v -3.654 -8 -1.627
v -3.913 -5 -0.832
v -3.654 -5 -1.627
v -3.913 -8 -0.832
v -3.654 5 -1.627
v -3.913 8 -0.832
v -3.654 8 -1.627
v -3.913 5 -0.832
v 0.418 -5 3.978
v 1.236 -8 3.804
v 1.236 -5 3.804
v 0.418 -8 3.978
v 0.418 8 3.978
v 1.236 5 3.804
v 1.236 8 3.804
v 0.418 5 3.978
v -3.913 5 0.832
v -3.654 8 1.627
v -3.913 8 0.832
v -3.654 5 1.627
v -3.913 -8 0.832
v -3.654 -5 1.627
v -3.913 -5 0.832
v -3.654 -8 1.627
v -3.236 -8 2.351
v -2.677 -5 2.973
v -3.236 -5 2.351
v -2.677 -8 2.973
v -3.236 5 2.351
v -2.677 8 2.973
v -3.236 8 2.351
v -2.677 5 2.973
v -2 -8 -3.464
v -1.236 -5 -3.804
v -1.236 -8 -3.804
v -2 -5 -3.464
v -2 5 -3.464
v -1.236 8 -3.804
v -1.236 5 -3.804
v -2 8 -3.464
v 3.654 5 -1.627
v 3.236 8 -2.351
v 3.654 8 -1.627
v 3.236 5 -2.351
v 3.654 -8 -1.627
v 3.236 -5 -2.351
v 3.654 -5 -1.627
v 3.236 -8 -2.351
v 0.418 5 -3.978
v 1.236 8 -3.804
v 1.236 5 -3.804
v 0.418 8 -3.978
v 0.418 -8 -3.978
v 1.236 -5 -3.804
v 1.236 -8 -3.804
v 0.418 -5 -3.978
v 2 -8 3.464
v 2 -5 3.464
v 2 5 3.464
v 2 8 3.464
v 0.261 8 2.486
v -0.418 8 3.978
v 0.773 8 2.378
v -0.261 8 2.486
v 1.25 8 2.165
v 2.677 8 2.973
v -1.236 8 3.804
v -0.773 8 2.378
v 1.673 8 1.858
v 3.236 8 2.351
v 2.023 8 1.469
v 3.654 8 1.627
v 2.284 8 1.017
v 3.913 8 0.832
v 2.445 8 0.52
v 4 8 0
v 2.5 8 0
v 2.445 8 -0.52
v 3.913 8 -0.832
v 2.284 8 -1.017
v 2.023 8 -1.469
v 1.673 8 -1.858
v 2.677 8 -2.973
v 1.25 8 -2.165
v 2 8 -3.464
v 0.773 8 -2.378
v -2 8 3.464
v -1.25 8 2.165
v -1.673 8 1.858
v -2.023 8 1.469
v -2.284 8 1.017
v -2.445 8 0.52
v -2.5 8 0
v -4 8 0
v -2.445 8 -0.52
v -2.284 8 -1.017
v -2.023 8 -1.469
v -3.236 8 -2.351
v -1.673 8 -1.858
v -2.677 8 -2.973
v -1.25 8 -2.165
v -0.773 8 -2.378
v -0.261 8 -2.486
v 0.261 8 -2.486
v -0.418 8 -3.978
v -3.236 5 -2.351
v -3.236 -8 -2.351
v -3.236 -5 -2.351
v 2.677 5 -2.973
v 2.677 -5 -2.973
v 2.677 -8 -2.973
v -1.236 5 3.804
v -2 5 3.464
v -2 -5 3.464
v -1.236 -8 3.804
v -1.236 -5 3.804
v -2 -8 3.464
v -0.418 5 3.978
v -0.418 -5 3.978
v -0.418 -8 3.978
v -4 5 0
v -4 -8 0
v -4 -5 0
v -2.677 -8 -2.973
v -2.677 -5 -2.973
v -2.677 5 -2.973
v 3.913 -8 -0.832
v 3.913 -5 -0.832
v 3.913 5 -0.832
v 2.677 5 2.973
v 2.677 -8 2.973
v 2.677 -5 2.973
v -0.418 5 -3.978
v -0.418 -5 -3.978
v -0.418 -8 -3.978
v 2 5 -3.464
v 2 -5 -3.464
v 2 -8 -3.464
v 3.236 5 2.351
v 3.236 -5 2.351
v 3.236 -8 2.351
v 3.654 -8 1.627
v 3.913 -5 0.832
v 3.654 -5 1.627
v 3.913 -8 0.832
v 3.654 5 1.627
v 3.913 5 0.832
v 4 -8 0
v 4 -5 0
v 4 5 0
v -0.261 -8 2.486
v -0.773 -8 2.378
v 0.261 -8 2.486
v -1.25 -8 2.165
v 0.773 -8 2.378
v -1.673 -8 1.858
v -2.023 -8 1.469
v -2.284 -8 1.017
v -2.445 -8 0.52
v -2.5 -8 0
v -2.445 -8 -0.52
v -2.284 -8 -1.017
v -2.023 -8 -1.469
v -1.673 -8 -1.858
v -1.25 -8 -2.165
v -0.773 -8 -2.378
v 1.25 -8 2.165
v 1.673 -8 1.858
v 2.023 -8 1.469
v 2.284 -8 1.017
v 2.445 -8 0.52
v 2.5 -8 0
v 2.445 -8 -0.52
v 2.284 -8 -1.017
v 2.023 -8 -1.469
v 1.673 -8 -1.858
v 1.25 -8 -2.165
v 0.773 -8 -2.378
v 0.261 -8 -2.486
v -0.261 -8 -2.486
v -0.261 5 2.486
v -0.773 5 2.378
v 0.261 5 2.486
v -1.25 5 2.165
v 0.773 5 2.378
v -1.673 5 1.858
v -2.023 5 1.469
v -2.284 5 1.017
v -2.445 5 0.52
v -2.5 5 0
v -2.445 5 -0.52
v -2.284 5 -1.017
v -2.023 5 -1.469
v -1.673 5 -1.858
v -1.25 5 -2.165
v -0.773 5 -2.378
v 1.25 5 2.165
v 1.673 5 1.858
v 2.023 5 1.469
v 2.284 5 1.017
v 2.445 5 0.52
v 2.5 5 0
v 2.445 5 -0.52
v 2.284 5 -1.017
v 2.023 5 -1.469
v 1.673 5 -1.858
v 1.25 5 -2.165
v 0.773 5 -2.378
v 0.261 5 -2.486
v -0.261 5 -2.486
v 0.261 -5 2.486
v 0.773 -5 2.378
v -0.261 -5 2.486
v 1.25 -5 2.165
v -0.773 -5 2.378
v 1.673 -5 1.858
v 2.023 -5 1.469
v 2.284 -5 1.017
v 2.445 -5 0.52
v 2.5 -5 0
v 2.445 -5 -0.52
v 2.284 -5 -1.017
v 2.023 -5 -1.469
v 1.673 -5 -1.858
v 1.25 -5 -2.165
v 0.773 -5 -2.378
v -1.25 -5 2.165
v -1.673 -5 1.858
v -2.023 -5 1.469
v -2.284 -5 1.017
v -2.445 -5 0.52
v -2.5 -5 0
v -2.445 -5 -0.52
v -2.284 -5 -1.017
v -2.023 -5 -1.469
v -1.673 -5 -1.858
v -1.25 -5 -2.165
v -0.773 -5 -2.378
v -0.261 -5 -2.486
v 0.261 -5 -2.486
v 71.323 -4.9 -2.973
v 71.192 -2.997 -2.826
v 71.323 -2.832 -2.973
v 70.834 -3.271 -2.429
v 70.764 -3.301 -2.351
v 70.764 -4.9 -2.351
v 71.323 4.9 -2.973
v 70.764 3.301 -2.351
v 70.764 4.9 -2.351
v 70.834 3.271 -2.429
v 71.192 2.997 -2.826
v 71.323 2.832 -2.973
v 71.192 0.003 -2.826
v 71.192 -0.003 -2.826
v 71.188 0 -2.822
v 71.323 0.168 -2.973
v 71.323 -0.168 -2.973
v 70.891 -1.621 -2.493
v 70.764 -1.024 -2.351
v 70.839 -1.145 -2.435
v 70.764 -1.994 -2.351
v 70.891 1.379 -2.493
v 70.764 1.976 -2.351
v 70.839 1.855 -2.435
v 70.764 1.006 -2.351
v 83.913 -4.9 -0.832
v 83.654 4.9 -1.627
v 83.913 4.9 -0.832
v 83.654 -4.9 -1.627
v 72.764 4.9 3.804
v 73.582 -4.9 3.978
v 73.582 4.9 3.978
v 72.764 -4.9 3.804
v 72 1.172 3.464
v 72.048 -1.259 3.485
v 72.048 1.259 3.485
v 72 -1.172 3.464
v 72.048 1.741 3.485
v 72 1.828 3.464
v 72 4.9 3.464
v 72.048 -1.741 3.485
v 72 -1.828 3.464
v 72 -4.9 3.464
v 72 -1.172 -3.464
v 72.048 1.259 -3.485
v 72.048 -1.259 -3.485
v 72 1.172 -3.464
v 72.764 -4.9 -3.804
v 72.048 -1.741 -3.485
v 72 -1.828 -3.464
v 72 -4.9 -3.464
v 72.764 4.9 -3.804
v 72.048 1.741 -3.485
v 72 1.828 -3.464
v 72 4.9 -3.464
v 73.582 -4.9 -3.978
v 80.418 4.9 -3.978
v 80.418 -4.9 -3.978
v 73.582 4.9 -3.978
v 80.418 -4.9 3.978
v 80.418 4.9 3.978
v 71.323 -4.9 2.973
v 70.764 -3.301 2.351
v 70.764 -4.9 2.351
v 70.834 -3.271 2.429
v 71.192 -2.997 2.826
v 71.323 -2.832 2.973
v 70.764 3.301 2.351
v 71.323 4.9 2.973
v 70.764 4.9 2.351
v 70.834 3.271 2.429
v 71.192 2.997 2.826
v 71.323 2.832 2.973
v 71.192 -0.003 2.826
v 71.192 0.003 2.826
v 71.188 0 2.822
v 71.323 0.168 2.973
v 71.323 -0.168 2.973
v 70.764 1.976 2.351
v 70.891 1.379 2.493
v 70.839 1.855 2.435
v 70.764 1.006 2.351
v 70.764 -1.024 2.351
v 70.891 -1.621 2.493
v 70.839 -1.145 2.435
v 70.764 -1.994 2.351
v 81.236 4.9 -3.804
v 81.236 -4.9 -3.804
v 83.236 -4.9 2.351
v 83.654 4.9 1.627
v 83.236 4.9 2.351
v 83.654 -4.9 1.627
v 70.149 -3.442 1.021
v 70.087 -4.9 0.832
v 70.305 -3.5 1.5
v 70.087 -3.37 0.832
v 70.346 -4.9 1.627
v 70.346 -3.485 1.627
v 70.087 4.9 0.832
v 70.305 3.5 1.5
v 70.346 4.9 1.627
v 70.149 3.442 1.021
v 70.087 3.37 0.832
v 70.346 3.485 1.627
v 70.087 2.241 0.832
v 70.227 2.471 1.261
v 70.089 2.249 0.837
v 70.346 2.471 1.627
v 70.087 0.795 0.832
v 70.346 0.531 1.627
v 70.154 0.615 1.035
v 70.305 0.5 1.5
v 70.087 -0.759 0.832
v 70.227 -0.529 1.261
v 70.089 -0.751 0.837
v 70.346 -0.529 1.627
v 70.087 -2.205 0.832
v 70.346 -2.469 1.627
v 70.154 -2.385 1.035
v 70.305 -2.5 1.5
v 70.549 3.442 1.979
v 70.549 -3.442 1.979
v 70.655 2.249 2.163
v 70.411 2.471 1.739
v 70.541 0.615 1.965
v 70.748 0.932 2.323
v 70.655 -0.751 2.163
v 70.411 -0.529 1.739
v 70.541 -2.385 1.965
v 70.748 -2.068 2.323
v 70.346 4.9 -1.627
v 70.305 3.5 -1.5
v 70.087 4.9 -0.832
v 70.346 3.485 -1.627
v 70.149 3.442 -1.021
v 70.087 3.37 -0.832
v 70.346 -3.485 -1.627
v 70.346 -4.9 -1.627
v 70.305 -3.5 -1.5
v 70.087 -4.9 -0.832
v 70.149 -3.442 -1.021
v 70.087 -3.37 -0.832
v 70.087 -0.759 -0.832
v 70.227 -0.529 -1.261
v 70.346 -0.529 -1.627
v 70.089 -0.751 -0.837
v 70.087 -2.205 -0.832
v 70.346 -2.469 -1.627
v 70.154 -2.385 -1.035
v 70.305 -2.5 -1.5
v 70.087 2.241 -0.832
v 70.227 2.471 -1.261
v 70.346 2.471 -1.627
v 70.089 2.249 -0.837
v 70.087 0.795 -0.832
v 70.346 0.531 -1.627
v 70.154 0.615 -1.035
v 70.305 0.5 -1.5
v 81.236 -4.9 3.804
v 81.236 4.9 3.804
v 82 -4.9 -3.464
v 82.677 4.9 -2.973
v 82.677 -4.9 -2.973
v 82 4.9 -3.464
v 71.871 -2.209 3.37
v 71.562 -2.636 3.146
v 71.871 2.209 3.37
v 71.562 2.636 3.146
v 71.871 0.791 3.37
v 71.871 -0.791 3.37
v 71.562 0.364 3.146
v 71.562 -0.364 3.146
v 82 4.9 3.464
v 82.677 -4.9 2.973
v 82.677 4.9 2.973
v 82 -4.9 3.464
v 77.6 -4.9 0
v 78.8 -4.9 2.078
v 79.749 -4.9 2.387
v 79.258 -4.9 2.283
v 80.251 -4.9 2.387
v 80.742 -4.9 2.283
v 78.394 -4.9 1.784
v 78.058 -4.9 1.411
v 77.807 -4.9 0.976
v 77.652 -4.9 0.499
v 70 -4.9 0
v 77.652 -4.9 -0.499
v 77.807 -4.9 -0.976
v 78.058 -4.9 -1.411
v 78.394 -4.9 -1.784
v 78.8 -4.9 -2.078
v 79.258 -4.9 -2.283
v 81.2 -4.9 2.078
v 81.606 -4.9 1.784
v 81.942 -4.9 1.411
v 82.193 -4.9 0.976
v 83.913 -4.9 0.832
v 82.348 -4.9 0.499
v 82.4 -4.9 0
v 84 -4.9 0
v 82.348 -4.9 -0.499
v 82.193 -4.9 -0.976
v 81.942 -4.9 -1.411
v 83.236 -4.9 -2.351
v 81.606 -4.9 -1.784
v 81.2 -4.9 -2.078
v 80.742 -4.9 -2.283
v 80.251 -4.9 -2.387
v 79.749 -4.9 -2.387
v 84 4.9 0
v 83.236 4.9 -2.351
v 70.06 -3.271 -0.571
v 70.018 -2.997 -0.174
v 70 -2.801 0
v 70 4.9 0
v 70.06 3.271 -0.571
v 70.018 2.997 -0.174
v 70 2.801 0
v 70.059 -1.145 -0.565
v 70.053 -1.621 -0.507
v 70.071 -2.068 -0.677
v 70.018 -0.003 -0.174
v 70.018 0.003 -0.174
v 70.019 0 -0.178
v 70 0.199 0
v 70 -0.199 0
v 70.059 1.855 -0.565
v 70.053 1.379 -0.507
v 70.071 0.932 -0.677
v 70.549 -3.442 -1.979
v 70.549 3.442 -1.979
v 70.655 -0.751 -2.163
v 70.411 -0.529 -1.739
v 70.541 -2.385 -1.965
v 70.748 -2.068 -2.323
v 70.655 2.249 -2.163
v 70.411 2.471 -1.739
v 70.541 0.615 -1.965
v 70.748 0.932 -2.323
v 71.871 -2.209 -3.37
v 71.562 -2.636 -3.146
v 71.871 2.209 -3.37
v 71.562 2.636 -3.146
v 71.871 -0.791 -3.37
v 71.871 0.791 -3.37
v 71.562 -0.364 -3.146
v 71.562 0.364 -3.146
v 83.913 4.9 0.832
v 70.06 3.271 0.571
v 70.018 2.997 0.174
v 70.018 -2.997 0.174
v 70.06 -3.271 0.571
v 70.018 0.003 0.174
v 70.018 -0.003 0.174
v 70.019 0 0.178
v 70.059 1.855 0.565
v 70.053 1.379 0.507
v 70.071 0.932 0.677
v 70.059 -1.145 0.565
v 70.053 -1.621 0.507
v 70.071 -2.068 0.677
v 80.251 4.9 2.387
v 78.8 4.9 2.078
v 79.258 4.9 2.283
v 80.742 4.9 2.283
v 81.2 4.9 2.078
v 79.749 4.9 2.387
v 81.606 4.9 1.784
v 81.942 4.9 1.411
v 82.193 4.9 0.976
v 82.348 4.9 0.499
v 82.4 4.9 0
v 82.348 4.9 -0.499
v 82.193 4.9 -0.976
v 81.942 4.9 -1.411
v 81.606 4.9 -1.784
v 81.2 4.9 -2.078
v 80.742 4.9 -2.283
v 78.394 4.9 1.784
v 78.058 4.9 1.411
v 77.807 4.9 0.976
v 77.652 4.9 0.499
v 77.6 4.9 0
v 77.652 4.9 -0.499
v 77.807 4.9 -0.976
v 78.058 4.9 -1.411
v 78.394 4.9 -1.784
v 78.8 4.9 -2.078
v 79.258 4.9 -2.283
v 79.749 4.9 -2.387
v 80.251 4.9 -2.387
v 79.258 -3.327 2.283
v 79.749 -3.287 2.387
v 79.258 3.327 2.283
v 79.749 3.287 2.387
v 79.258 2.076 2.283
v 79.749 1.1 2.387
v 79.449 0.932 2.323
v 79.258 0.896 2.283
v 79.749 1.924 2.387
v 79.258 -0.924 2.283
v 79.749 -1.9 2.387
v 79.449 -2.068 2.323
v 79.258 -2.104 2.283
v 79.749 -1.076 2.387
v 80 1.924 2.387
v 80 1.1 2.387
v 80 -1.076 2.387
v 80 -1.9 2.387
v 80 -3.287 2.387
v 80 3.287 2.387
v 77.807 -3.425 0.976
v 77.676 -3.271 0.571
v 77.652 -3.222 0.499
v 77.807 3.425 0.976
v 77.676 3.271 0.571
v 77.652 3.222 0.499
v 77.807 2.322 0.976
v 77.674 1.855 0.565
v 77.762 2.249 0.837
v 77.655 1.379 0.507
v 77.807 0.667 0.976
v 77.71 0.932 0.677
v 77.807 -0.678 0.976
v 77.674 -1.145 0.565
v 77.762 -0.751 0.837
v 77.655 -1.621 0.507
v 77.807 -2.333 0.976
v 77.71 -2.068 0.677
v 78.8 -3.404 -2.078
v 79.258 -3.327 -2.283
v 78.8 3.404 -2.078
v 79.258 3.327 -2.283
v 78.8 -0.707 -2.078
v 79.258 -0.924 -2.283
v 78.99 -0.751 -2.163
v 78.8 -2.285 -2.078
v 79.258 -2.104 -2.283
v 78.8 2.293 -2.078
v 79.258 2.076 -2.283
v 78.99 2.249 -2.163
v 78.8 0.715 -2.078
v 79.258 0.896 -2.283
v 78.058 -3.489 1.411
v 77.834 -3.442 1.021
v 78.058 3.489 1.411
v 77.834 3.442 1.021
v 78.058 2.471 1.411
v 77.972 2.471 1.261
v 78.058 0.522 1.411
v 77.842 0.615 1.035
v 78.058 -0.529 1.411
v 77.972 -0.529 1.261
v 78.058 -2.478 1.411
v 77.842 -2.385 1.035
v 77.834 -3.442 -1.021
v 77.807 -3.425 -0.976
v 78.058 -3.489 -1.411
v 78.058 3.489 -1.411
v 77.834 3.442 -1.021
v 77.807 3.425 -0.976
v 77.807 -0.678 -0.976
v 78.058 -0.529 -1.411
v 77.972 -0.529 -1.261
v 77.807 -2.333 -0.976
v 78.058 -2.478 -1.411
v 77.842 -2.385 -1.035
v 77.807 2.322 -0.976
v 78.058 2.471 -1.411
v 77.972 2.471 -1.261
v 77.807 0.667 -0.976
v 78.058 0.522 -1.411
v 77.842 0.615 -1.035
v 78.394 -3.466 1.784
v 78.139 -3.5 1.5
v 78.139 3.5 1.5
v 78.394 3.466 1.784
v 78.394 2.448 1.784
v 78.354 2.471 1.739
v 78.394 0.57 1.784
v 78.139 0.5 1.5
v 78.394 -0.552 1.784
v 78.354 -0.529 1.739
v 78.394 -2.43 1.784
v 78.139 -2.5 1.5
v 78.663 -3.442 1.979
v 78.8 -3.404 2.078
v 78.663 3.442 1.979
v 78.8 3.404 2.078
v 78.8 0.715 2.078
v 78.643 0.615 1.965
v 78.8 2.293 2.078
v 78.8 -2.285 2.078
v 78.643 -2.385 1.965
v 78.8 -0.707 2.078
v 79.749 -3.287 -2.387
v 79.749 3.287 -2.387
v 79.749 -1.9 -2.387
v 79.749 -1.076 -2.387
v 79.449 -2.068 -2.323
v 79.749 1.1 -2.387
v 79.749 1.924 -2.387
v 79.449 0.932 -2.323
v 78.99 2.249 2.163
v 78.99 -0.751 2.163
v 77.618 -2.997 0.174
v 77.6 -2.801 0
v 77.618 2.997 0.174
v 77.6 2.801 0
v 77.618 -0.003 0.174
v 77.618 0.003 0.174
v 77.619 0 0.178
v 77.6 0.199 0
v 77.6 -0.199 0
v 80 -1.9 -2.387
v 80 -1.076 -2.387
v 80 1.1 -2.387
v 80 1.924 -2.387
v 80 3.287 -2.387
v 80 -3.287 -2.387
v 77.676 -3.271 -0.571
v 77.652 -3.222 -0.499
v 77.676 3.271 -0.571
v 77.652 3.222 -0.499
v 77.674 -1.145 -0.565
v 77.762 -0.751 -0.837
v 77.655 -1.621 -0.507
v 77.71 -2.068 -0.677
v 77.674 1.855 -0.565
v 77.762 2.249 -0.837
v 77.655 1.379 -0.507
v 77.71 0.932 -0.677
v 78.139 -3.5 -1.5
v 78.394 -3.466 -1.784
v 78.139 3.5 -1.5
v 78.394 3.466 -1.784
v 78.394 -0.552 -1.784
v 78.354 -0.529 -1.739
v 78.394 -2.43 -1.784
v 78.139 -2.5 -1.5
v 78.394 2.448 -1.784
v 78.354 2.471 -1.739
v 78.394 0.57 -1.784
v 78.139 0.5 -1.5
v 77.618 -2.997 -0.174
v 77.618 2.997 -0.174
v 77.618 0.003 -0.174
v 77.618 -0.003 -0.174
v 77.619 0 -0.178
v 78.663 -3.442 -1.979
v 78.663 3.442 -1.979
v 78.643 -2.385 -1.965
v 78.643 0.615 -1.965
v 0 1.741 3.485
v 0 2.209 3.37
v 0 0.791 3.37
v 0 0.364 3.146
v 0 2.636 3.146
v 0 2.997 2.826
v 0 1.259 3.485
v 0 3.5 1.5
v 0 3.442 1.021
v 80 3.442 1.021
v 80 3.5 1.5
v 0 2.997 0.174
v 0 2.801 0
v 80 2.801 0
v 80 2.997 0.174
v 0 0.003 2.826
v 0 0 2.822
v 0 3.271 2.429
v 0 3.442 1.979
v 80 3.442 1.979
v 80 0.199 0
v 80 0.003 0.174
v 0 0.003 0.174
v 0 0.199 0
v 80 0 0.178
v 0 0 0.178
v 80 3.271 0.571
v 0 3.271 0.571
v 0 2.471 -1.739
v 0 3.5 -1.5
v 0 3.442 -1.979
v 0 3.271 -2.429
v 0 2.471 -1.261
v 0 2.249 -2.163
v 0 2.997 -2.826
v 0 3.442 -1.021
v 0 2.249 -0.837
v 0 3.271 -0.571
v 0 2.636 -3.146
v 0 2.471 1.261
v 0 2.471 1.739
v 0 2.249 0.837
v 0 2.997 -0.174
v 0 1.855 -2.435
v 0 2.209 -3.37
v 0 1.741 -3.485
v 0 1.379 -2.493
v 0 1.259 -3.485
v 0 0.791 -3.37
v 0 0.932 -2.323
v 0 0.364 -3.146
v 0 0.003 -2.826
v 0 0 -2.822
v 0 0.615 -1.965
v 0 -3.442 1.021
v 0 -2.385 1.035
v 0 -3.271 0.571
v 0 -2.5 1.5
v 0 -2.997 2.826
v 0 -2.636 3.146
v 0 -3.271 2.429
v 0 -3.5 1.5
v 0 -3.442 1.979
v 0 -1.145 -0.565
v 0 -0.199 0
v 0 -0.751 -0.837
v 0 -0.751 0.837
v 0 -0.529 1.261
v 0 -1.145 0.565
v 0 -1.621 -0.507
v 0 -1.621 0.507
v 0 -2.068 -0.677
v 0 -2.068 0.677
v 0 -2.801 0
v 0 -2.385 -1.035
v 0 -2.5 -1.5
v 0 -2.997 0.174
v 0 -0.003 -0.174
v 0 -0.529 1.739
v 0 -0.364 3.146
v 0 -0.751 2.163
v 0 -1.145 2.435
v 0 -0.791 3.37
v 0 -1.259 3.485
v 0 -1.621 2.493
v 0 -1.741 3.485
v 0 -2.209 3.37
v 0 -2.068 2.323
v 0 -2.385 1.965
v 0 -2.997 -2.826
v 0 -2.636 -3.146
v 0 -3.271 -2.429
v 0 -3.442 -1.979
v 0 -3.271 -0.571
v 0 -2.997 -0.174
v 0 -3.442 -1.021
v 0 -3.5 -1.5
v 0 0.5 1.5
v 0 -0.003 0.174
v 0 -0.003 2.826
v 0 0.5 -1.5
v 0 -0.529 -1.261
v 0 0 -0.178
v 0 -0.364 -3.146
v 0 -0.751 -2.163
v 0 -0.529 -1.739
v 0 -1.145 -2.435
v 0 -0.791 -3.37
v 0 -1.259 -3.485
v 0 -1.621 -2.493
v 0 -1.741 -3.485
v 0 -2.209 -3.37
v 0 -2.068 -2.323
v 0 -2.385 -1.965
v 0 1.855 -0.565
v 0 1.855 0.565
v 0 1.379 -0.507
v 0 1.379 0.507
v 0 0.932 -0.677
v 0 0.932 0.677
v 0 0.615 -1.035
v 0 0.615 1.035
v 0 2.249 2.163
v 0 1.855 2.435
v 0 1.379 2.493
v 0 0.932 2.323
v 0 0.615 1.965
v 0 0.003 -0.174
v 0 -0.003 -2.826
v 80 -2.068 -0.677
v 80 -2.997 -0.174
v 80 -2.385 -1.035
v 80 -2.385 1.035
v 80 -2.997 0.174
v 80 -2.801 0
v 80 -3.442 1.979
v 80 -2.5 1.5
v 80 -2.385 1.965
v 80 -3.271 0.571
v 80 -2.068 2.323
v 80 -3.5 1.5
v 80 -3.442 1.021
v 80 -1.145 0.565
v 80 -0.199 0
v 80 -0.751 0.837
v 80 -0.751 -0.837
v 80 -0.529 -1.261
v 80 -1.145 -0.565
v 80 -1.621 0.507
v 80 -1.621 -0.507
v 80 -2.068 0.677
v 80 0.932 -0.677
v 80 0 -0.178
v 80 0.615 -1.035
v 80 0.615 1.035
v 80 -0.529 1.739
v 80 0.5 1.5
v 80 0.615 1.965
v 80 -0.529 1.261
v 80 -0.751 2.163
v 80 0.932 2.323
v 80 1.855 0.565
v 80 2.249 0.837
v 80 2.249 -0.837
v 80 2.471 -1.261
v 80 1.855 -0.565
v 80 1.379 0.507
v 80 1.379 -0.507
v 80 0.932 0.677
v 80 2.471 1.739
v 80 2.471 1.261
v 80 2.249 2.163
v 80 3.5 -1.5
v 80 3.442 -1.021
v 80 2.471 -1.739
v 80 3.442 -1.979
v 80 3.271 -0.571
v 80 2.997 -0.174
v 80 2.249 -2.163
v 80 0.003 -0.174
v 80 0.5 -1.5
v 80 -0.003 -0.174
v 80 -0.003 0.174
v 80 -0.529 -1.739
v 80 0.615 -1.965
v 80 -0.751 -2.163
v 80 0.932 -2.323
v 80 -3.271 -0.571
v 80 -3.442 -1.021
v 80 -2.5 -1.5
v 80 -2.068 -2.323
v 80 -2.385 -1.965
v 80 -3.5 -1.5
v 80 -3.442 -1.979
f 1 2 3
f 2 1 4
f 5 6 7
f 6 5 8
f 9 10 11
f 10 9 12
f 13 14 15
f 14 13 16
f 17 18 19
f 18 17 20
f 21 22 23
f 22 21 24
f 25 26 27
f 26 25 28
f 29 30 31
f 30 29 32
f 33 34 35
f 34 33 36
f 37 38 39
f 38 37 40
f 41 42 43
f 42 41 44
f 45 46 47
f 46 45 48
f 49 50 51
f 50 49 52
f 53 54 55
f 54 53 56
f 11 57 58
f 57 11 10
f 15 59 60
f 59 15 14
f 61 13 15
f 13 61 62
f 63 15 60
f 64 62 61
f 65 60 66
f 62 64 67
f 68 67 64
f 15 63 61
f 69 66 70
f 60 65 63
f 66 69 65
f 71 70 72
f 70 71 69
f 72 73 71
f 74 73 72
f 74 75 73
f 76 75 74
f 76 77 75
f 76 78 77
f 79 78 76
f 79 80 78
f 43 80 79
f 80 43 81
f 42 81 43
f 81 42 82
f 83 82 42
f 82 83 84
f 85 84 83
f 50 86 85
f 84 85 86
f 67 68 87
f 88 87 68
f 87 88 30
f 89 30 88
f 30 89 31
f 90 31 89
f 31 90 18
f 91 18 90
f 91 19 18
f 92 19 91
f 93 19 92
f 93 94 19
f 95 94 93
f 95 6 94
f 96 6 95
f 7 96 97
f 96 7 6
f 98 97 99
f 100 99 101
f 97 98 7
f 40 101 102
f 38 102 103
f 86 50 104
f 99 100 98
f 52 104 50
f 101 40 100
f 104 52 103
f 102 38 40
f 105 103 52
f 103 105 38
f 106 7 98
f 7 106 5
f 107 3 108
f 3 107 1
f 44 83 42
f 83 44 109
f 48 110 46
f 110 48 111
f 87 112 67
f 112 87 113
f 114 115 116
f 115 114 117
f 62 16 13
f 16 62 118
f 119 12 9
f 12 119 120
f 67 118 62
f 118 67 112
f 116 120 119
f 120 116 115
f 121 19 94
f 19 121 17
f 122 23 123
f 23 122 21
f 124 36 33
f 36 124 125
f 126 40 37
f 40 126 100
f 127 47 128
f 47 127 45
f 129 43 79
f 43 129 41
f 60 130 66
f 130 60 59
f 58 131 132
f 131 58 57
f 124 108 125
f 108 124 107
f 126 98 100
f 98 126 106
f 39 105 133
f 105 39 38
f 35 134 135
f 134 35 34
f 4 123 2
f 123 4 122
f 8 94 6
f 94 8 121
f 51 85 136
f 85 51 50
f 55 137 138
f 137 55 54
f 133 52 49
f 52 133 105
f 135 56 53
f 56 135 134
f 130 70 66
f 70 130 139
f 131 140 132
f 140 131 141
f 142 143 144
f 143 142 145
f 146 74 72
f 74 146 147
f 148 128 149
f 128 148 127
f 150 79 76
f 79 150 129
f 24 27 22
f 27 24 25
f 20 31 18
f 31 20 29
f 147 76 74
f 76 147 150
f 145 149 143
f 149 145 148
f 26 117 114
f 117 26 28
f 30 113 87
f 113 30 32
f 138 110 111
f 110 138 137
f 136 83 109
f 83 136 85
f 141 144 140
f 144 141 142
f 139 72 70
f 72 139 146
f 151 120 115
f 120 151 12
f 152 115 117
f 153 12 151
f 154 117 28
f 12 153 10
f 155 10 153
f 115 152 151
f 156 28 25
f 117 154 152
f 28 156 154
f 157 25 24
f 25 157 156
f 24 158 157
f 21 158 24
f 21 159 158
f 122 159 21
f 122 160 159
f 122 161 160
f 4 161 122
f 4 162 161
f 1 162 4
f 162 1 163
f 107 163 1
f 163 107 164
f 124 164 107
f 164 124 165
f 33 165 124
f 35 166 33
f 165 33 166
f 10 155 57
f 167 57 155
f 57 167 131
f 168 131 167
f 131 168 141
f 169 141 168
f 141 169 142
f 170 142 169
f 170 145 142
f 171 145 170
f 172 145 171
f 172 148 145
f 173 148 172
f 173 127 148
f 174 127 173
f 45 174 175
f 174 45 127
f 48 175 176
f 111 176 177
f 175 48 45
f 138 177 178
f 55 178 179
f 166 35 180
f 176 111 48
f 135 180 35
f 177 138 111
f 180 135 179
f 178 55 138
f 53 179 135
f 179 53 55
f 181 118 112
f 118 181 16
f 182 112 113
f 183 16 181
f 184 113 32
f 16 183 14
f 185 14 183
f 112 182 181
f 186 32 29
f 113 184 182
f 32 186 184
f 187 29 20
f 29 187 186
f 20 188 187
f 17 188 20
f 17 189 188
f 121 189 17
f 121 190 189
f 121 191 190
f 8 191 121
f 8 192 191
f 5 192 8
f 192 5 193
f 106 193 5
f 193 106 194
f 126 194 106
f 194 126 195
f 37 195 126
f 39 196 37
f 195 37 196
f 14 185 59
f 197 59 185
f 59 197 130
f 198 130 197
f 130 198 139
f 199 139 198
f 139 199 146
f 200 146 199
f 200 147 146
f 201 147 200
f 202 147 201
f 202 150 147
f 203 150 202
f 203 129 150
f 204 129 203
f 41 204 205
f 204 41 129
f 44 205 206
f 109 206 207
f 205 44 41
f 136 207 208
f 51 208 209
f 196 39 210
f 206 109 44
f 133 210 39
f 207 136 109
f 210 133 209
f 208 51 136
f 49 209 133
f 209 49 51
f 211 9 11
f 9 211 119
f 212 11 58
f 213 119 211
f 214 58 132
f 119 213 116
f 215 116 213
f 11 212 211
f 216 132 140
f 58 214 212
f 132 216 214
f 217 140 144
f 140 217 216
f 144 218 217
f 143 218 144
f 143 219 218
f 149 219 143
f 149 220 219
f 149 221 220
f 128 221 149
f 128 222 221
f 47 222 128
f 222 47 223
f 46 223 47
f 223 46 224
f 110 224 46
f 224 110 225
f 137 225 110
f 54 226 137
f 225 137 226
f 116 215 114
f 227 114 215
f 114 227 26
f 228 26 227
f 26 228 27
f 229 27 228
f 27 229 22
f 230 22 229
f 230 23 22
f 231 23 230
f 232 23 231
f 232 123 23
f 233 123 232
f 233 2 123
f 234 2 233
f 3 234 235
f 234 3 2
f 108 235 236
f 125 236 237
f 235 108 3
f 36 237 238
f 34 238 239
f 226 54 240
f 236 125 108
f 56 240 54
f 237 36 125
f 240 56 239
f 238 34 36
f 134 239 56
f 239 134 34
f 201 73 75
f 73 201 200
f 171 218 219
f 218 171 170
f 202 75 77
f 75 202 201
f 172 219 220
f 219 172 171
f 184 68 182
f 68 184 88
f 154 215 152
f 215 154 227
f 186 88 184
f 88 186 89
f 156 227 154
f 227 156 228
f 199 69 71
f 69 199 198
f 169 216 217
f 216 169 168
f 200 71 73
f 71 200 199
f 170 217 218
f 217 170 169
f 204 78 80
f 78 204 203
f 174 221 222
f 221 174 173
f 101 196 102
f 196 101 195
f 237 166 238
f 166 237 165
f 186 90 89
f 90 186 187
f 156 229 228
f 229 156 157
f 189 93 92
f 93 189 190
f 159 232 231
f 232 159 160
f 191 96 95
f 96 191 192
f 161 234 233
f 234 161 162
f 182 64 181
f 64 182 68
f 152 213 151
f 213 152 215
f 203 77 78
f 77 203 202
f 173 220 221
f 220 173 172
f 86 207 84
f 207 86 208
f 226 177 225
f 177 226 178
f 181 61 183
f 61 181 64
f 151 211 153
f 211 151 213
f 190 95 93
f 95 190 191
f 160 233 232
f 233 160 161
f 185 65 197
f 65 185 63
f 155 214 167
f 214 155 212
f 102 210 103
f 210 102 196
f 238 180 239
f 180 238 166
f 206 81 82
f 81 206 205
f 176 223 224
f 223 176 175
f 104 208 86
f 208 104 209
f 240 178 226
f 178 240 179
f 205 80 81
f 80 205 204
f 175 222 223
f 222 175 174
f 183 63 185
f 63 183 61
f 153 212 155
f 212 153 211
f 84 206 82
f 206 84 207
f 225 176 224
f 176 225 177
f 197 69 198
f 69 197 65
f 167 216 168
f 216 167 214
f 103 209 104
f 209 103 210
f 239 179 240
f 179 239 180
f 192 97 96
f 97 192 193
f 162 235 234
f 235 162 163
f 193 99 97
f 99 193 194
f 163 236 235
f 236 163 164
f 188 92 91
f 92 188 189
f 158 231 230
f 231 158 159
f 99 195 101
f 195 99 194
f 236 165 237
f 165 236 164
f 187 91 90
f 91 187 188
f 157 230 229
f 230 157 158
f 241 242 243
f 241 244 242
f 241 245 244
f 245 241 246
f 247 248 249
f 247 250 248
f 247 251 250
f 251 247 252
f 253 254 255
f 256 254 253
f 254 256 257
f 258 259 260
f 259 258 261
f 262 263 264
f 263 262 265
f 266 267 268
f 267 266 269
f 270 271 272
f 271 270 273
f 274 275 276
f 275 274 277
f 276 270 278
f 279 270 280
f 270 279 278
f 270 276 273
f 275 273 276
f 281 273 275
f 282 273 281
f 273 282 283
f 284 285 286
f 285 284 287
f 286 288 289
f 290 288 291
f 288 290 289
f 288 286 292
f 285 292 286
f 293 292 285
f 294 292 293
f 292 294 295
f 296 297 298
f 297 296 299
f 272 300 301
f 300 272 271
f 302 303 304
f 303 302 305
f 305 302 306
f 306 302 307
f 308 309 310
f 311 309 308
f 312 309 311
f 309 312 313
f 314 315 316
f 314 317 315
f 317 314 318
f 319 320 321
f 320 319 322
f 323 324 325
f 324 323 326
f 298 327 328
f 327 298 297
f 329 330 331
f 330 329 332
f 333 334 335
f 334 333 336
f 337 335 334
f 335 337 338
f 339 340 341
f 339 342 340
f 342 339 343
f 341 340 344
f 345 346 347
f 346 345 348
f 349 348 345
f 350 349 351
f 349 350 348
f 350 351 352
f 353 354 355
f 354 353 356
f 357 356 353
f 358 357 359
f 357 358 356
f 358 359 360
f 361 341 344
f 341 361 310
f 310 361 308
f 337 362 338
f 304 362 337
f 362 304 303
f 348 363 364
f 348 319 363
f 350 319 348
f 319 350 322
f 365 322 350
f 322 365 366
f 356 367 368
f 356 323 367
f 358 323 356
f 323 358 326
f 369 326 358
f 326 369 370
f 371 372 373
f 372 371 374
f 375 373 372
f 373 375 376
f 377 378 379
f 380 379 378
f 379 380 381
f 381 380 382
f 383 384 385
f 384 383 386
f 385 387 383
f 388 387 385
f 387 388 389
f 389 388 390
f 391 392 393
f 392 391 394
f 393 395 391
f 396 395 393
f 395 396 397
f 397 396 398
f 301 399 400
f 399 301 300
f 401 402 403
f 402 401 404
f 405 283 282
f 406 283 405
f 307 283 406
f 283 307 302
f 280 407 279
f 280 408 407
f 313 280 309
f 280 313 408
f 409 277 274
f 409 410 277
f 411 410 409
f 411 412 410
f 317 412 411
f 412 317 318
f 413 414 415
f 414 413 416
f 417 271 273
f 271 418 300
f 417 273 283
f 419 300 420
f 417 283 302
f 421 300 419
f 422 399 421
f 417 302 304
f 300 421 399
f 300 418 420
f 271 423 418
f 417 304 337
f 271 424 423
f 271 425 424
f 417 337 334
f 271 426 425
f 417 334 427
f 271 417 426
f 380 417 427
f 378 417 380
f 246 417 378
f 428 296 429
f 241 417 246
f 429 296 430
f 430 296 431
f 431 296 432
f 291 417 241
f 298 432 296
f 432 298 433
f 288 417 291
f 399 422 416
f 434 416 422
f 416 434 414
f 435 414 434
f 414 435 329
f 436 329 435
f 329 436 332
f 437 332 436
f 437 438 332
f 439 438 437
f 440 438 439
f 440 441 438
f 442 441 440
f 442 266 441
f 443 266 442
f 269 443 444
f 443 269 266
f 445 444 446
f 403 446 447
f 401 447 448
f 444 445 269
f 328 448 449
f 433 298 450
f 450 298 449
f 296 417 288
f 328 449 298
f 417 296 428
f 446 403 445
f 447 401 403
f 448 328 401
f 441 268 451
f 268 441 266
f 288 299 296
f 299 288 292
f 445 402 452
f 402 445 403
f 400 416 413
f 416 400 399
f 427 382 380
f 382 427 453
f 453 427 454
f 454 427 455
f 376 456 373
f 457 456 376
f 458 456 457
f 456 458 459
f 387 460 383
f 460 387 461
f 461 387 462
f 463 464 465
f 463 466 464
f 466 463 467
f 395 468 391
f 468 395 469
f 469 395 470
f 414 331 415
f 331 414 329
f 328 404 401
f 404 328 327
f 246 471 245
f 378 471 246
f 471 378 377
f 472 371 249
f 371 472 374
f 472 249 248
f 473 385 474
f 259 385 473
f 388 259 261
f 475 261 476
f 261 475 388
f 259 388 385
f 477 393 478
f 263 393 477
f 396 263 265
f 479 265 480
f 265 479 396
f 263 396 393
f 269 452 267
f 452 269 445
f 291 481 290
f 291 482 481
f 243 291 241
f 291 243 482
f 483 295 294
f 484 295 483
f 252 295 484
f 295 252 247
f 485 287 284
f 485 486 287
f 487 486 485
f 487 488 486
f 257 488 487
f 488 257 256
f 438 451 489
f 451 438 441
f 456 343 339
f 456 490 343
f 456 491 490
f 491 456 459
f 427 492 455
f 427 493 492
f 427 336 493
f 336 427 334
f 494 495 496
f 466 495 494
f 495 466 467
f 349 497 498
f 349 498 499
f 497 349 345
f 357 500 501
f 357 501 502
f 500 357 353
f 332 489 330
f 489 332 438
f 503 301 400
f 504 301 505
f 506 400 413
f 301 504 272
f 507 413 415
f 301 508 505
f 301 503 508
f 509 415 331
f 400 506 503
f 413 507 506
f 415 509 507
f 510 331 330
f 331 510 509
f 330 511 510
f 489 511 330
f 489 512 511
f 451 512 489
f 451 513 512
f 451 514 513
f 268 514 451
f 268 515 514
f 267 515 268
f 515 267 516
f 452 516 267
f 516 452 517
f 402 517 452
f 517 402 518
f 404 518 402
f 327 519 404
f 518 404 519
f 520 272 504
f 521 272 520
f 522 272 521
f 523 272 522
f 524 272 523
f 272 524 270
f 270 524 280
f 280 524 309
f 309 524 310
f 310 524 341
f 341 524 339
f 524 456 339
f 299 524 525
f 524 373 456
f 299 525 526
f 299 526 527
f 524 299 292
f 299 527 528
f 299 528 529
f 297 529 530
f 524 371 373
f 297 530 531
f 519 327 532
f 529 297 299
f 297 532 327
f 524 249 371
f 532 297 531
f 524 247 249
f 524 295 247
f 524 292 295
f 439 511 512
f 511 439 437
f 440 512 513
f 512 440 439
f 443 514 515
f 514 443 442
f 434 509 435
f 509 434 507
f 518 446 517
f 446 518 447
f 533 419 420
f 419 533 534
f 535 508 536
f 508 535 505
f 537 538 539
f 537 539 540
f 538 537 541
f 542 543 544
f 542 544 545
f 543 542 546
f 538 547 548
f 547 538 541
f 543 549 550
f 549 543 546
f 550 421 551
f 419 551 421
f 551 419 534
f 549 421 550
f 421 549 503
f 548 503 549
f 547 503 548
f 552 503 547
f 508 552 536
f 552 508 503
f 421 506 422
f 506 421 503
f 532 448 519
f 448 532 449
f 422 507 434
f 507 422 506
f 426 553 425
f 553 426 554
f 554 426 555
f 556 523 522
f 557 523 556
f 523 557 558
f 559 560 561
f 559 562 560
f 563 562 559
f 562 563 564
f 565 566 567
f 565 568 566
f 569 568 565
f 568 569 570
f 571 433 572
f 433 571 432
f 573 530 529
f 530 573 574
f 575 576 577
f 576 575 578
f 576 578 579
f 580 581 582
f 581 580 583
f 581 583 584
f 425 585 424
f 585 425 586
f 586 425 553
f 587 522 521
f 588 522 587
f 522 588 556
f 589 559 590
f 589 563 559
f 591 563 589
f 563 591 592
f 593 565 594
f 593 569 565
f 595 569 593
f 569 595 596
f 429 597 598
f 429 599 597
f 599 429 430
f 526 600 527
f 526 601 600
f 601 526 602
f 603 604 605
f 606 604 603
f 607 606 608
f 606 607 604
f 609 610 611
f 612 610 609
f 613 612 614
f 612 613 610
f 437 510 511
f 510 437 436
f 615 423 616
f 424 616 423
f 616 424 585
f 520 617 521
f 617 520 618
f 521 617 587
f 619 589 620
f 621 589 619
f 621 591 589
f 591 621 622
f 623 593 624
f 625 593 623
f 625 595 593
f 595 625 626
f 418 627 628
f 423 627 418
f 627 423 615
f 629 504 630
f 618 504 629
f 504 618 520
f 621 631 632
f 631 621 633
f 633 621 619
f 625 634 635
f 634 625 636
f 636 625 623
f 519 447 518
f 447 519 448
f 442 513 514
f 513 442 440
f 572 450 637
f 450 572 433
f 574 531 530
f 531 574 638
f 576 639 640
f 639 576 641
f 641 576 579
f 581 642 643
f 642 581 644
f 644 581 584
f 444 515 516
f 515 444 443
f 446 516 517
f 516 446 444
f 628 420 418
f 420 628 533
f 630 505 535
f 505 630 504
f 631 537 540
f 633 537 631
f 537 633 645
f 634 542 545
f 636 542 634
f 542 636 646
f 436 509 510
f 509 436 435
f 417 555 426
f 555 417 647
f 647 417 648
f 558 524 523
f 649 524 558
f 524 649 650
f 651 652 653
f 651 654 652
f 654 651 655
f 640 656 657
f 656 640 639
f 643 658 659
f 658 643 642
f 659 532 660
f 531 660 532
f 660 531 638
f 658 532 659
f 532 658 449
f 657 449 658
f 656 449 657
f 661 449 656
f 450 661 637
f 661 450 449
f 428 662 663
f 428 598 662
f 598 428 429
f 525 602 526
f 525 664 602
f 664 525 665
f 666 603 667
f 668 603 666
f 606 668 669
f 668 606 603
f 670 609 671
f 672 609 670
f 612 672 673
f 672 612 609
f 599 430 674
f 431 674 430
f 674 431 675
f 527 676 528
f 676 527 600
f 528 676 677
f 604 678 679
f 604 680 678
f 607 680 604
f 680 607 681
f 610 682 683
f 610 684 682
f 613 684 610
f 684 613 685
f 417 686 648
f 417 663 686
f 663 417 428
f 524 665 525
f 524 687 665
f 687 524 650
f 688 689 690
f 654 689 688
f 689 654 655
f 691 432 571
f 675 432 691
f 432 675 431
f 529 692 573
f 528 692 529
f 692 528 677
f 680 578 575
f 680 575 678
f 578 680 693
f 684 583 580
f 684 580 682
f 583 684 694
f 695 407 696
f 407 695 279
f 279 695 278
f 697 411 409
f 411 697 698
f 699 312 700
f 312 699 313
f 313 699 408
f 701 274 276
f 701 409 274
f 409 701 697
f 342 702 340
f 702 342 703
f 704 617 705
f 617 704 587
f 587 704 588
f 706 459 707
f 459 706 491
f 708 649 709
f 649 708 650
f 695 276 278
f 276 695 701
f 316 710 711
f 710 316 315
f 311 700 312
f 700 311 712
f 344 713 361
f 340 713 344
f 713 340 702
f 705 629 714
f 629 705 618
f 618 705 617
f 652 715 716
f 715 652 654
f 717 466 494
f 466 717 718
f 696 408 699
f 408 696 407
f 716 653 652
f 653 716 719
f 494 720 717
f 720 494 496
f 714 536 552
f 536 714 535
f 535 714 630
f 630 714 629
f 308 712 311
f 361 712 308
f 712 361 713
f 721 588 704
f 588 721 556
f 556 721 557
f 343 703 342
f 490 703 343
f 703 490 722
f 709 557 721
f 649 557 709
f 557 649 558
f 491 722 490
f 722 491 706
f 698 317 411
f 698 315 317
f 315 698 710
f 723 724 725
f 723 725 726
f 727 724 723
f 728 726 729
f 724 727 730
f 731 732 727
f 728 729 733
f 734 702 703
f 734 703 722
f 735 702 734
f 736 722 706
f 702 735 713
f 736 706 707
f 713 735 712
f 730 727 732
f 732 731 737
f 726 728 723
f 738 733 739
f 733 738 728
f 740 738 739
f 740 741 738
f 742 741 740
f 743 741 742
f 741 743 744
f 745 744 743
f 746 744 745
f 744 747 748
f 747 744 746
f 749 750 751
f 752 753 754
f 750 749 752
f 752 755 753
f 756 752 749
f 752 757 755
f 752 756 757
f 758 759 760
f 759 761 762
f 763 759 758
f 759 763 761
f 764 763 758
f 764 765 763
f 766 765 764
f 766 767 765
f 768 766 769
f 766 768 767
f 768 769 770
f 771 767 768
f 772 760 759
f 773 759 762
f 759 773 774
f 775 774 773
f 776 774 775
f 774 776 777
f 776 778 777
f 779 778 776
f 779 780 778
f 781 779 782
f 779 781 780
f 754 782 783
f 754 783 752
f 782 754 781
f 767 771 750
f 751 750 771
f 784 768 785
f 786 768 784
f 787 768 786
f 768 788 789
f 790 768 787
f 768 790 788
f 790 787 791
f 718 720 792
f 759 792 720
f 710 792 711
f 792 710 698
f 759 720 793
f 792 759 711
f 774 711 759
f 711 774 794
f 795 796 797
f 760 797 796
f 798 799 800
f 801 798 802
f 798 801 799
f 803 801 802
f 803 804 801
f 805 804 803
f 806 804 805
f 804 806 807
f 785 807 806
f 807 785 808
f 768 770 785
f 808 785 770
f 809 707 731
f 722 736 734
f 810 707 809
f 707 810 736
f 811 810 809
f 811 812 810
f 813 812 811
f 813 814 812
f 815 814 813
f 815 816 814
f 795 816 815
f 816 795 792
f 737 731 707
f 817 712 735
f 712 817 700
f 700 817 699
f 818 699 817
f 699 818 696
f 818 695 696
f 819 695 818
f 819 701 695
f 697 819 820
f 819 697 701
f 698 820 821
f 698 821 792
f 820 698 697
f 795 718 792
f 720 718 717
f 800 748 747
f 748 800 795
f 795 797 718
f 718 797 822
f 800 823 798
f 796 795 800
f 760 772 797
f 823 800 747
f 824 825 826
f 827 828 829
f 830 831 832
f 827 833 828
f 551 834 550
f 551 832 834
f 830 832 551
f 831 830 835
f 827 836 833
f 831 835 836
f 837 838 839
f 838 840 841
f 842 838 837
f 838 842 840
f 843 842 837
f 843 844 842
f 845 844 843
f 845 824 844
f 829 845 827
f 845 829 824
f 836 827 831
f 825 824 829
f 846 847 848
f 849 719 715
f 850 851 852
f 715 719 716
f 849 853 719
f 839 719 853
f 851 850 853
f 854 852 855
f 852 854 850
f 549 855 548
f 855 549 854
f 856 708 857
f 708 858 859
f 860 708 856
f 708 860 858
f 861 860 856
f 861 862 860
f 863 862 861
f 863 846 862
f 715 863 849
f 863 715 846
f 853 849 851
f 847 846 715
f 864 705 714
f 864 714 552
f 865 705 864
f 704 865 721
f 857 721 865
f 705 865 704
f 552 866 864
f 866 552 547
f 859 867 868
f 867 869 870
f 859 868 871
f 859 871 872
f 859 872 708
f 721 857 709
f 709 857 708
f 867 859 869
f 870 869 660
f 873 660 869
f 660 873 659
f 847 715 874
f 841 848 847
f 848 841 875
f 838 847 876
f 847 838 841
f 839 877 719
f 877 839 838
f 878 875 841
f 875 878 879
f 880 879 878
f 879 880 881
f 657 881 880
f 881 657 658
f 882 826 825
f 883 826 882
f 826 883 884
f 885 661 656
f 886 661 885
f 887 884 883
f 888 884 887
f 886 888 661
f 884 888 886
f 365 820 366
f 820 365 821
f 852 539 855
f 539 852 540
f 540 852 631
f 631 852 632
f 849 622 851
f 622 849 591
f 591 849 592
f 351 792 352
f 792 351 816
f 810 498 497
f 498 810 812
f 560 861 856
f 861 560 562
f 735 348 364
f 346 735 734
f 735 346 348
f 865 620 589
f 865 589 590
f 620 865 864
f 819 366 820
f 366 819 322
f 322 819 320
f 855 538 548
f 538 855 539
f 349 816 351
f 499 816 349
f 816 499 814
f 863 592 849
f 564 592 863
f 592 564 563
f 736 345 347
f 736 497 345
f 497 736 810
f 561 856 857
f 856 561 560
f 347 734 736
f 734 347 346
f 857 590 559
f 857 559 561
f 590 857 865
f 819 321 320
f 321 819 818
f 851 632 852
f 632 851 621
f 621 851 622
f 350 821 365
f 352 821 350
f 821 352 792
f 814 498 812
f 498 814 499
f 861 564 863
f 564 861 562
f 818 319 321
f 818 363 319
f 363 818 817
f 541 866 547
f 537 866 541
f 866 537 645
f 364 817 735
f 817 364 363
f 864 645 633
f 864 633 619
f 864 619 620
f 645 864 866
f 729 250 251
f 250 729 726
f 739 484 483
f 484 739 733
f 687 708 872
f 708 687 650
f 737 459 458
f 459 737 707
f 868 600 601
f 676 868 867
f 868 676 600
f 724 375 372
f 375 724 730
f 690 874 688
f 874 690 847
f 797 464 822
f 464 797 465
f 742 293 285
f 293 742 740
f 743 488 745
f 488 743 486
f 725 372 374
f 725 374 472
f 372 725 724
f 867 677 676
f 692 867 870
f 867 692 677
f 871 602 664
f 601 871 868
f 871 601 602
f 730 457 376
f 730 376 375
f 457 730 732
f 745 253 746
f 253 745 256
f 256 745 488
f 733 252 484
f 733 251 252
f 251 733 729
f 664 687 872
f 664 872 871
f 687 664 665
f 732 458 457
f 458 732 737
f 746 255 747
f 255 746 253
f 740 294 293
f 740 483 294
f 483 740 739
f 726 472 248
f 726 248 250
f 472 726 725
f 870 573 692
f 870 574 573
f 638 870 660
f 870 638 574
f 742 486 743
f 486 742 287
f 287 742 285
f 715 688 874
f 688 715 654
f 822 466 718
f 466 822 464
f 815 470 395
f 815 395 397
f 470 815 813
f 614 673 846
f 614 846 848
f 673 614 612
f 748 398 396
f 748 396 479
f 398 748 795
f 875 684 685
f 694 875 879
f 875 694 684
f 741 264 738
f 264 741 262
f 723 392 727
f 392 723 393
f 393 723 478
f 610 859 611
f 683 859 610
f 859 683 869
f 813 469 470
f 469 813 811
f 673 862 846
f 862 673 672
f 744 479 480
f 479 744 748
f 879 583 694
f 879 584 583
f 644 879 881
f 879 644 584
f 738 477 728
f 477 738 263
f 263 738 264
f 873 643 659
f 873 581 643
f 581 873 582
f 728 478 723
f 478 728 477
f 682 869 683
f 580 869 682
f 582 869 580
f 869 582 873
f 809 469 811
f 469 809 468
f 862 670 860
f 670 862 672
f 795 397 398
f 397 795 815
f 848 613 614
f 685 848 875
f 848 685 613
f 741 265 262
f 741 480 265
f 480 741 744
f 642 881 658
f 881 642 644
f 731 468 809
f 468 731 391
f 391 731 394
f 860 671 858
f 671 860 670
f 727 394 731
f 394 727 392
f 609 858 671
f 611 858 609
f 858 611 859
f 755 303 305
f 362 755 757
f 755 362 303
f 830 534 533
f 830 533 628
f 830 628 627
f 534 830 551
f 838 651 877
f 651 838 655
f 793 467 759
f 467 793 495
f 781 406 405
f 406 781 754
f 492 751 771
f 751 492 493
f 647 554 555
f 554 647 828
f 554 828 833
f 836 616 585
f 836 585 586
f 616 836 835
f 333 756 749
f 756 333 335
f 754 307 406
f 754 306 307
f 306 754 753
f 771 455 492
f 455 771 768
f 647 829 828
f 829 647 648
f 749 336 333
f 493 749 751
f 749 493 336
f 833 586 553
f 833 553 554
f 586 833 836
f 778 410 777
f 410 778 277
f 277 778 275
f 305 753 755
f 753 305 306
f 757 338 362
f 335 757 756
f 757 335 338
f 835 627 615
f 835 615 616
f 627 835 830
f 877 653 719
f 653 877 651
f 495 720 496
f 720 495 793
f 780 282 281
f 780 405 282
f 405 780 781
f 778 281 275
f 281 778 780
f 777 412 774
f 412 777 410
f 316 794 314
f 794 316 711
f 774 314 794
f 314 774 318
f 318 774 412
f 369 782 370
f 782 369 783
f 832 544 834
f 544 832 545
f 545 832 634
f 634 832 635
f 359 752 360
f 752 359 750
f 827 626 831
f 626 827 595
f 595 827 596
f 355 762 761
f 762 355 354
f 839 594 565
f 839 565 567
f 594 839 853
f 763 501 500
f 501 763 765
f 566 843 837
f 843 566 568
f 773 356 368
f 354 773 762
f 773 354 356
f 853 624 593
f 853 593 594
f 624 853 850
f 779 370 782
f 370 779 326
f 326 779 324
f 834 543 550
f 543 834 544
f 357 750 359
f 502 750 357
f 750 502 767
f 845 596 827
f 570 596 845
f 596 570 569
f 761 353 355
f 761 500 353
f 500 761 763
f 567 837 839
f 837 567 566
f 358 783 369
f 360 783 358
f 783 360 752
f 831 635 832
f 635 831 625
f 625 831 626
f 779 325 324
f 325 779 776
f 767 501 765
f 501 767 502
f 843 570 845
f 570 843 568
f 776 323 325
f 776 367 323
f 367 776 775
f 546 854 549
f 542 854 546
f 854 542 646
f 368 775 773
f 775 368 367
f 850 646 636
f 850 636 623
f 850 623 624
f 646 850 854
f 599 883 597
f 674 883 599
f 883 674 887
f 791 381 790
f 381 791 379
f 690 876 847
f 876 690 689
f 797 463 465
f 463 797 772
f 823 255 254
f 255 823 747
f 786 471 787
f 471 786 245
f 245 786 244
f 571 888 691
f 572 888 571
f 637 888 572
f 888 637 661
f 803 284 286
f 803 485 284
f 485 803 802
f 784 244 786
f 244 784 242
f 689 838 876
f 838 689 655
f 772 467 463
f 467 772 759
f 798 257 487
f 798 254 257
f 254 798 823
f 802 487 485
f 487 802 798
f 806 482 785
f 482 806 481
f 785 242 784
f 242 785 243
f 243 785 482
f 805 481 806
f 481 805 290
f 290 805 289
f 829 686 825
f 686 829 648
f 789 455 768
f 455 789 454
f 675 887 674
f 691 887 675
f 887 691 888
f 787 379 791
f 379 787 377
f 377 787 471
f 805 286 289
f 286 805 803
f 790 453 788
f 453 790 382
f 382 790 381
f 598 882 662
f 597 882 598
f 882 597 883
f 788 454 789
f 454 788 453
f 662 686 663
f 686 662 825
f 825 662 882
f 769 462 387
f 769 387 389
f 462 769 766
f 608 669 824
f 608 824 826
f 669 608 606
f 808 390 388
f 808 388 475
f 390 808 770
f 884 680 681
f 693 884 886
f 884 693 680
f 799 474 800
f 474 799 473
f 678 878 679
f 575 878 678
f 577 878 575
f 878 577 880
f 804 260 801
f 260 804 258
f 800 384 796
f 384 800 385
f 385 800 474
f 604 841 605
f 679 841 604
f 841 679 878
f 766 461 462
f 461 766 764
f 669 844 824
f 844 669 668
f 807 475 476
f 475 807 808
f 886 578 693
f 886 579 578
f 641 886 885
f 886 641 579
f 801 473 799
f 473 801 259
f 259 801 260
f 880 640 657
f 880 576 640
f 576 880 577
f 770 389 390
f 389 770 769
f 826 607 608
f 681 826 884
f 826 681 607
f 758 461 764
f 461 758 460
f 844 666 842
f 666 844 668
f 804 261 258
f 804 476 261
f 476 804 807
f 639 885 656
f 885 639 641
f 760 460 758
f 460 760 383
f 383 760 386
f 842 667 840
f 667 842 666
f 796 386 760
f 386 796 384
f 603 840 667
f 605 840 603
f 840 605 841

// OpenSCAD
// file: ../modules/foot-common-parts.scad
module jointUpper() {
    difference() {
        hull() {
            children();
            rotate([90,0,0])
            translate([0,0,-8])
            cylinder(r=4,h=16); 
        }
         hull(){
            rotate([90,0,0]) {
                translate([0,0,-5])
                cylinder(h=10,r=5);
                translate([-5,10,-5])
                cylinder(h=10,r=5);

                translate([-5,-5,-5])
                cylinder(h=10,r=5);

            }
        }
        rotate([90,0,0])
        translate([0,0,-10]){
            cylinder(h=20,r=2.5);
        }
    }
}

module jointLower(x) {
    difference() {
    hull() {
                rotate([90,0,0])
                translate([x,0,-4.9])
                cylinder(h=9.8,r=4);
                
                rotate([90,0,0])
                translate([x-6,0,-4.9])
                cylinder(h=9.8,r=4);
                
                
            }
            rotate([90,0,0])
            translate([x,0,-8])
            cylinder(h=16,r=2.4);
        }
}

//creates a cylinder from [x1,y1,z1] to [x2,y2,z2] with radius r
module pointCylinder(x1,y1,z1,x2,y2,z2,r, extend=false) {
    x= x2-x1;
    y= y2-y1;
    z= z2-z1;
    
    x_vect = [y,-x,0]; // = cross([x,y,z],[0,0,1])

    y_vect = cross([x,y,z],x_vect);

    m = [
    [y/norm(x_vect),y_vect[0]/norm(y_vect),x,x1],
    [-x/norm(x_vect),y_vect[1]/ norm(y_vect),y,y1],
    [0,y_vect[2]/ norm(y_vect),z,z1],
    [0,0,0,1]
    ];

    multmatrix(m)
    if (extend){
        translate([0,0,-1])
        cylinder(r=r,h=3);
        }
    else 
    {cylinder(r=r,h=1);}
}

 module offset_3d(r=1, size=1000) {
     n = $fn==undef ? 12: $fn;
     if(r==0) children();
     else 
         if( r>0 )
             minkowski(convexity=5){
                 children();
                 sphere(r, $fn=n);
             }
         else {
             size2 = size*[1,1,1];// this will form the positv
             size1 = size2*2;    // this will hold a negative inside
             difference(){
                 cube(size2, center=true);// forms the positiv by substracting the negative
                 minkowski(convexity=5){
                     difference(){
                         cube(size1, center=true);
                         children();
                     }
                     sphere(-r, $fn=n);
                 }
             }
         }
 }

module tendonTube (x1,y1,z1,x2,y2,z2,smooth=true) {
    difference() {
        
            hull() {
            pointCylinder(x1,y1,z1,x2,y2,z2,2);
            children();
            
            }
            if (smooth) {
                difference() {
                    pointCylinder(x1,y1,z1,x2,y2,z2,1.5, true);
                    offset_3d(0.5)
                    offset_3d(-0.5)
                    difference(){
                        hull(){
                            pointCylinder(x1,y1,z1,x2,y2,z2,2);
                            children();
                        }
                        pointCylinder(x1,y1,z1,x2,y2,z2,1, true);
                    }    
               }
           }
           else {
               pointCylinder(x1,y1,z1,x2,y2,z2,1, true);
           }
        }
    }
    
module tendonAttachments (x1,z1,x2,z2) {
    difference() {
        hull() {
            children();
            translate([x1,0,z1])
            rotate([90,0,0])
            translate([0,0,-2])
            cylinder(r=2,h=4); 
            translate([x2,0,z2])
            rotate([90,0,0])
            translate([0,0,-2])
            cylinder(r=2,h=4);            
        }
        translate([x1,0,z1])
        rotate([90,0,0])
        translate([0,0,-10])
        cylinder(h=20,r=1);
        
        translate([x2,0,z2])
        rotate([90,0,0])
        translate([0,0,-10])
        cylinder(h=20,r=1);
    }
}
// main file
$fs = 0.5;
use <../modules/foot-common-parts.scad>

smooth = false;

module metatarsus() {
    jointUpper() {
        
        }
        
    jointLower(80);
    tendonTube(0,1.5,1.5,80,1.5,1.5, smooth);
    tendonTube(0,1.5,-1.5,80,1.5,-1.5,smooth);
    tendonTube(0,-1.5,1.5,80,-1.5,1.5,smooth);
    tendonTube(0,-1.5,-1.5,80,-1.5,-1.5,smooth);
}

metatarsus();
